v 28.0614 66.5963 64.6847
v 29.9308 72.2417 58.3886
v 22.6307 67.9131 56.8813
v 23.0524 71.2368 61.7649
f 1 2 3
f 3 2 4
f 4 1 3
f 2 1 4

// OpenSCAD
// Auto-generated auxetic polyhedron
points = [
    [22.630669, 67.913069, 56.881282],
    [29.930752, 72.241674, 58.388554],
    [28.061367, 66.596320, 64.684680],
    [23.052413, 71.236801, 61.764940],
];

faces = [
    [0, 1, 2],
    [3, 1, 0],
    [0, 2, 3],
    [3, 2, 1],
];

polyhedron(points = points, faces = faces);
